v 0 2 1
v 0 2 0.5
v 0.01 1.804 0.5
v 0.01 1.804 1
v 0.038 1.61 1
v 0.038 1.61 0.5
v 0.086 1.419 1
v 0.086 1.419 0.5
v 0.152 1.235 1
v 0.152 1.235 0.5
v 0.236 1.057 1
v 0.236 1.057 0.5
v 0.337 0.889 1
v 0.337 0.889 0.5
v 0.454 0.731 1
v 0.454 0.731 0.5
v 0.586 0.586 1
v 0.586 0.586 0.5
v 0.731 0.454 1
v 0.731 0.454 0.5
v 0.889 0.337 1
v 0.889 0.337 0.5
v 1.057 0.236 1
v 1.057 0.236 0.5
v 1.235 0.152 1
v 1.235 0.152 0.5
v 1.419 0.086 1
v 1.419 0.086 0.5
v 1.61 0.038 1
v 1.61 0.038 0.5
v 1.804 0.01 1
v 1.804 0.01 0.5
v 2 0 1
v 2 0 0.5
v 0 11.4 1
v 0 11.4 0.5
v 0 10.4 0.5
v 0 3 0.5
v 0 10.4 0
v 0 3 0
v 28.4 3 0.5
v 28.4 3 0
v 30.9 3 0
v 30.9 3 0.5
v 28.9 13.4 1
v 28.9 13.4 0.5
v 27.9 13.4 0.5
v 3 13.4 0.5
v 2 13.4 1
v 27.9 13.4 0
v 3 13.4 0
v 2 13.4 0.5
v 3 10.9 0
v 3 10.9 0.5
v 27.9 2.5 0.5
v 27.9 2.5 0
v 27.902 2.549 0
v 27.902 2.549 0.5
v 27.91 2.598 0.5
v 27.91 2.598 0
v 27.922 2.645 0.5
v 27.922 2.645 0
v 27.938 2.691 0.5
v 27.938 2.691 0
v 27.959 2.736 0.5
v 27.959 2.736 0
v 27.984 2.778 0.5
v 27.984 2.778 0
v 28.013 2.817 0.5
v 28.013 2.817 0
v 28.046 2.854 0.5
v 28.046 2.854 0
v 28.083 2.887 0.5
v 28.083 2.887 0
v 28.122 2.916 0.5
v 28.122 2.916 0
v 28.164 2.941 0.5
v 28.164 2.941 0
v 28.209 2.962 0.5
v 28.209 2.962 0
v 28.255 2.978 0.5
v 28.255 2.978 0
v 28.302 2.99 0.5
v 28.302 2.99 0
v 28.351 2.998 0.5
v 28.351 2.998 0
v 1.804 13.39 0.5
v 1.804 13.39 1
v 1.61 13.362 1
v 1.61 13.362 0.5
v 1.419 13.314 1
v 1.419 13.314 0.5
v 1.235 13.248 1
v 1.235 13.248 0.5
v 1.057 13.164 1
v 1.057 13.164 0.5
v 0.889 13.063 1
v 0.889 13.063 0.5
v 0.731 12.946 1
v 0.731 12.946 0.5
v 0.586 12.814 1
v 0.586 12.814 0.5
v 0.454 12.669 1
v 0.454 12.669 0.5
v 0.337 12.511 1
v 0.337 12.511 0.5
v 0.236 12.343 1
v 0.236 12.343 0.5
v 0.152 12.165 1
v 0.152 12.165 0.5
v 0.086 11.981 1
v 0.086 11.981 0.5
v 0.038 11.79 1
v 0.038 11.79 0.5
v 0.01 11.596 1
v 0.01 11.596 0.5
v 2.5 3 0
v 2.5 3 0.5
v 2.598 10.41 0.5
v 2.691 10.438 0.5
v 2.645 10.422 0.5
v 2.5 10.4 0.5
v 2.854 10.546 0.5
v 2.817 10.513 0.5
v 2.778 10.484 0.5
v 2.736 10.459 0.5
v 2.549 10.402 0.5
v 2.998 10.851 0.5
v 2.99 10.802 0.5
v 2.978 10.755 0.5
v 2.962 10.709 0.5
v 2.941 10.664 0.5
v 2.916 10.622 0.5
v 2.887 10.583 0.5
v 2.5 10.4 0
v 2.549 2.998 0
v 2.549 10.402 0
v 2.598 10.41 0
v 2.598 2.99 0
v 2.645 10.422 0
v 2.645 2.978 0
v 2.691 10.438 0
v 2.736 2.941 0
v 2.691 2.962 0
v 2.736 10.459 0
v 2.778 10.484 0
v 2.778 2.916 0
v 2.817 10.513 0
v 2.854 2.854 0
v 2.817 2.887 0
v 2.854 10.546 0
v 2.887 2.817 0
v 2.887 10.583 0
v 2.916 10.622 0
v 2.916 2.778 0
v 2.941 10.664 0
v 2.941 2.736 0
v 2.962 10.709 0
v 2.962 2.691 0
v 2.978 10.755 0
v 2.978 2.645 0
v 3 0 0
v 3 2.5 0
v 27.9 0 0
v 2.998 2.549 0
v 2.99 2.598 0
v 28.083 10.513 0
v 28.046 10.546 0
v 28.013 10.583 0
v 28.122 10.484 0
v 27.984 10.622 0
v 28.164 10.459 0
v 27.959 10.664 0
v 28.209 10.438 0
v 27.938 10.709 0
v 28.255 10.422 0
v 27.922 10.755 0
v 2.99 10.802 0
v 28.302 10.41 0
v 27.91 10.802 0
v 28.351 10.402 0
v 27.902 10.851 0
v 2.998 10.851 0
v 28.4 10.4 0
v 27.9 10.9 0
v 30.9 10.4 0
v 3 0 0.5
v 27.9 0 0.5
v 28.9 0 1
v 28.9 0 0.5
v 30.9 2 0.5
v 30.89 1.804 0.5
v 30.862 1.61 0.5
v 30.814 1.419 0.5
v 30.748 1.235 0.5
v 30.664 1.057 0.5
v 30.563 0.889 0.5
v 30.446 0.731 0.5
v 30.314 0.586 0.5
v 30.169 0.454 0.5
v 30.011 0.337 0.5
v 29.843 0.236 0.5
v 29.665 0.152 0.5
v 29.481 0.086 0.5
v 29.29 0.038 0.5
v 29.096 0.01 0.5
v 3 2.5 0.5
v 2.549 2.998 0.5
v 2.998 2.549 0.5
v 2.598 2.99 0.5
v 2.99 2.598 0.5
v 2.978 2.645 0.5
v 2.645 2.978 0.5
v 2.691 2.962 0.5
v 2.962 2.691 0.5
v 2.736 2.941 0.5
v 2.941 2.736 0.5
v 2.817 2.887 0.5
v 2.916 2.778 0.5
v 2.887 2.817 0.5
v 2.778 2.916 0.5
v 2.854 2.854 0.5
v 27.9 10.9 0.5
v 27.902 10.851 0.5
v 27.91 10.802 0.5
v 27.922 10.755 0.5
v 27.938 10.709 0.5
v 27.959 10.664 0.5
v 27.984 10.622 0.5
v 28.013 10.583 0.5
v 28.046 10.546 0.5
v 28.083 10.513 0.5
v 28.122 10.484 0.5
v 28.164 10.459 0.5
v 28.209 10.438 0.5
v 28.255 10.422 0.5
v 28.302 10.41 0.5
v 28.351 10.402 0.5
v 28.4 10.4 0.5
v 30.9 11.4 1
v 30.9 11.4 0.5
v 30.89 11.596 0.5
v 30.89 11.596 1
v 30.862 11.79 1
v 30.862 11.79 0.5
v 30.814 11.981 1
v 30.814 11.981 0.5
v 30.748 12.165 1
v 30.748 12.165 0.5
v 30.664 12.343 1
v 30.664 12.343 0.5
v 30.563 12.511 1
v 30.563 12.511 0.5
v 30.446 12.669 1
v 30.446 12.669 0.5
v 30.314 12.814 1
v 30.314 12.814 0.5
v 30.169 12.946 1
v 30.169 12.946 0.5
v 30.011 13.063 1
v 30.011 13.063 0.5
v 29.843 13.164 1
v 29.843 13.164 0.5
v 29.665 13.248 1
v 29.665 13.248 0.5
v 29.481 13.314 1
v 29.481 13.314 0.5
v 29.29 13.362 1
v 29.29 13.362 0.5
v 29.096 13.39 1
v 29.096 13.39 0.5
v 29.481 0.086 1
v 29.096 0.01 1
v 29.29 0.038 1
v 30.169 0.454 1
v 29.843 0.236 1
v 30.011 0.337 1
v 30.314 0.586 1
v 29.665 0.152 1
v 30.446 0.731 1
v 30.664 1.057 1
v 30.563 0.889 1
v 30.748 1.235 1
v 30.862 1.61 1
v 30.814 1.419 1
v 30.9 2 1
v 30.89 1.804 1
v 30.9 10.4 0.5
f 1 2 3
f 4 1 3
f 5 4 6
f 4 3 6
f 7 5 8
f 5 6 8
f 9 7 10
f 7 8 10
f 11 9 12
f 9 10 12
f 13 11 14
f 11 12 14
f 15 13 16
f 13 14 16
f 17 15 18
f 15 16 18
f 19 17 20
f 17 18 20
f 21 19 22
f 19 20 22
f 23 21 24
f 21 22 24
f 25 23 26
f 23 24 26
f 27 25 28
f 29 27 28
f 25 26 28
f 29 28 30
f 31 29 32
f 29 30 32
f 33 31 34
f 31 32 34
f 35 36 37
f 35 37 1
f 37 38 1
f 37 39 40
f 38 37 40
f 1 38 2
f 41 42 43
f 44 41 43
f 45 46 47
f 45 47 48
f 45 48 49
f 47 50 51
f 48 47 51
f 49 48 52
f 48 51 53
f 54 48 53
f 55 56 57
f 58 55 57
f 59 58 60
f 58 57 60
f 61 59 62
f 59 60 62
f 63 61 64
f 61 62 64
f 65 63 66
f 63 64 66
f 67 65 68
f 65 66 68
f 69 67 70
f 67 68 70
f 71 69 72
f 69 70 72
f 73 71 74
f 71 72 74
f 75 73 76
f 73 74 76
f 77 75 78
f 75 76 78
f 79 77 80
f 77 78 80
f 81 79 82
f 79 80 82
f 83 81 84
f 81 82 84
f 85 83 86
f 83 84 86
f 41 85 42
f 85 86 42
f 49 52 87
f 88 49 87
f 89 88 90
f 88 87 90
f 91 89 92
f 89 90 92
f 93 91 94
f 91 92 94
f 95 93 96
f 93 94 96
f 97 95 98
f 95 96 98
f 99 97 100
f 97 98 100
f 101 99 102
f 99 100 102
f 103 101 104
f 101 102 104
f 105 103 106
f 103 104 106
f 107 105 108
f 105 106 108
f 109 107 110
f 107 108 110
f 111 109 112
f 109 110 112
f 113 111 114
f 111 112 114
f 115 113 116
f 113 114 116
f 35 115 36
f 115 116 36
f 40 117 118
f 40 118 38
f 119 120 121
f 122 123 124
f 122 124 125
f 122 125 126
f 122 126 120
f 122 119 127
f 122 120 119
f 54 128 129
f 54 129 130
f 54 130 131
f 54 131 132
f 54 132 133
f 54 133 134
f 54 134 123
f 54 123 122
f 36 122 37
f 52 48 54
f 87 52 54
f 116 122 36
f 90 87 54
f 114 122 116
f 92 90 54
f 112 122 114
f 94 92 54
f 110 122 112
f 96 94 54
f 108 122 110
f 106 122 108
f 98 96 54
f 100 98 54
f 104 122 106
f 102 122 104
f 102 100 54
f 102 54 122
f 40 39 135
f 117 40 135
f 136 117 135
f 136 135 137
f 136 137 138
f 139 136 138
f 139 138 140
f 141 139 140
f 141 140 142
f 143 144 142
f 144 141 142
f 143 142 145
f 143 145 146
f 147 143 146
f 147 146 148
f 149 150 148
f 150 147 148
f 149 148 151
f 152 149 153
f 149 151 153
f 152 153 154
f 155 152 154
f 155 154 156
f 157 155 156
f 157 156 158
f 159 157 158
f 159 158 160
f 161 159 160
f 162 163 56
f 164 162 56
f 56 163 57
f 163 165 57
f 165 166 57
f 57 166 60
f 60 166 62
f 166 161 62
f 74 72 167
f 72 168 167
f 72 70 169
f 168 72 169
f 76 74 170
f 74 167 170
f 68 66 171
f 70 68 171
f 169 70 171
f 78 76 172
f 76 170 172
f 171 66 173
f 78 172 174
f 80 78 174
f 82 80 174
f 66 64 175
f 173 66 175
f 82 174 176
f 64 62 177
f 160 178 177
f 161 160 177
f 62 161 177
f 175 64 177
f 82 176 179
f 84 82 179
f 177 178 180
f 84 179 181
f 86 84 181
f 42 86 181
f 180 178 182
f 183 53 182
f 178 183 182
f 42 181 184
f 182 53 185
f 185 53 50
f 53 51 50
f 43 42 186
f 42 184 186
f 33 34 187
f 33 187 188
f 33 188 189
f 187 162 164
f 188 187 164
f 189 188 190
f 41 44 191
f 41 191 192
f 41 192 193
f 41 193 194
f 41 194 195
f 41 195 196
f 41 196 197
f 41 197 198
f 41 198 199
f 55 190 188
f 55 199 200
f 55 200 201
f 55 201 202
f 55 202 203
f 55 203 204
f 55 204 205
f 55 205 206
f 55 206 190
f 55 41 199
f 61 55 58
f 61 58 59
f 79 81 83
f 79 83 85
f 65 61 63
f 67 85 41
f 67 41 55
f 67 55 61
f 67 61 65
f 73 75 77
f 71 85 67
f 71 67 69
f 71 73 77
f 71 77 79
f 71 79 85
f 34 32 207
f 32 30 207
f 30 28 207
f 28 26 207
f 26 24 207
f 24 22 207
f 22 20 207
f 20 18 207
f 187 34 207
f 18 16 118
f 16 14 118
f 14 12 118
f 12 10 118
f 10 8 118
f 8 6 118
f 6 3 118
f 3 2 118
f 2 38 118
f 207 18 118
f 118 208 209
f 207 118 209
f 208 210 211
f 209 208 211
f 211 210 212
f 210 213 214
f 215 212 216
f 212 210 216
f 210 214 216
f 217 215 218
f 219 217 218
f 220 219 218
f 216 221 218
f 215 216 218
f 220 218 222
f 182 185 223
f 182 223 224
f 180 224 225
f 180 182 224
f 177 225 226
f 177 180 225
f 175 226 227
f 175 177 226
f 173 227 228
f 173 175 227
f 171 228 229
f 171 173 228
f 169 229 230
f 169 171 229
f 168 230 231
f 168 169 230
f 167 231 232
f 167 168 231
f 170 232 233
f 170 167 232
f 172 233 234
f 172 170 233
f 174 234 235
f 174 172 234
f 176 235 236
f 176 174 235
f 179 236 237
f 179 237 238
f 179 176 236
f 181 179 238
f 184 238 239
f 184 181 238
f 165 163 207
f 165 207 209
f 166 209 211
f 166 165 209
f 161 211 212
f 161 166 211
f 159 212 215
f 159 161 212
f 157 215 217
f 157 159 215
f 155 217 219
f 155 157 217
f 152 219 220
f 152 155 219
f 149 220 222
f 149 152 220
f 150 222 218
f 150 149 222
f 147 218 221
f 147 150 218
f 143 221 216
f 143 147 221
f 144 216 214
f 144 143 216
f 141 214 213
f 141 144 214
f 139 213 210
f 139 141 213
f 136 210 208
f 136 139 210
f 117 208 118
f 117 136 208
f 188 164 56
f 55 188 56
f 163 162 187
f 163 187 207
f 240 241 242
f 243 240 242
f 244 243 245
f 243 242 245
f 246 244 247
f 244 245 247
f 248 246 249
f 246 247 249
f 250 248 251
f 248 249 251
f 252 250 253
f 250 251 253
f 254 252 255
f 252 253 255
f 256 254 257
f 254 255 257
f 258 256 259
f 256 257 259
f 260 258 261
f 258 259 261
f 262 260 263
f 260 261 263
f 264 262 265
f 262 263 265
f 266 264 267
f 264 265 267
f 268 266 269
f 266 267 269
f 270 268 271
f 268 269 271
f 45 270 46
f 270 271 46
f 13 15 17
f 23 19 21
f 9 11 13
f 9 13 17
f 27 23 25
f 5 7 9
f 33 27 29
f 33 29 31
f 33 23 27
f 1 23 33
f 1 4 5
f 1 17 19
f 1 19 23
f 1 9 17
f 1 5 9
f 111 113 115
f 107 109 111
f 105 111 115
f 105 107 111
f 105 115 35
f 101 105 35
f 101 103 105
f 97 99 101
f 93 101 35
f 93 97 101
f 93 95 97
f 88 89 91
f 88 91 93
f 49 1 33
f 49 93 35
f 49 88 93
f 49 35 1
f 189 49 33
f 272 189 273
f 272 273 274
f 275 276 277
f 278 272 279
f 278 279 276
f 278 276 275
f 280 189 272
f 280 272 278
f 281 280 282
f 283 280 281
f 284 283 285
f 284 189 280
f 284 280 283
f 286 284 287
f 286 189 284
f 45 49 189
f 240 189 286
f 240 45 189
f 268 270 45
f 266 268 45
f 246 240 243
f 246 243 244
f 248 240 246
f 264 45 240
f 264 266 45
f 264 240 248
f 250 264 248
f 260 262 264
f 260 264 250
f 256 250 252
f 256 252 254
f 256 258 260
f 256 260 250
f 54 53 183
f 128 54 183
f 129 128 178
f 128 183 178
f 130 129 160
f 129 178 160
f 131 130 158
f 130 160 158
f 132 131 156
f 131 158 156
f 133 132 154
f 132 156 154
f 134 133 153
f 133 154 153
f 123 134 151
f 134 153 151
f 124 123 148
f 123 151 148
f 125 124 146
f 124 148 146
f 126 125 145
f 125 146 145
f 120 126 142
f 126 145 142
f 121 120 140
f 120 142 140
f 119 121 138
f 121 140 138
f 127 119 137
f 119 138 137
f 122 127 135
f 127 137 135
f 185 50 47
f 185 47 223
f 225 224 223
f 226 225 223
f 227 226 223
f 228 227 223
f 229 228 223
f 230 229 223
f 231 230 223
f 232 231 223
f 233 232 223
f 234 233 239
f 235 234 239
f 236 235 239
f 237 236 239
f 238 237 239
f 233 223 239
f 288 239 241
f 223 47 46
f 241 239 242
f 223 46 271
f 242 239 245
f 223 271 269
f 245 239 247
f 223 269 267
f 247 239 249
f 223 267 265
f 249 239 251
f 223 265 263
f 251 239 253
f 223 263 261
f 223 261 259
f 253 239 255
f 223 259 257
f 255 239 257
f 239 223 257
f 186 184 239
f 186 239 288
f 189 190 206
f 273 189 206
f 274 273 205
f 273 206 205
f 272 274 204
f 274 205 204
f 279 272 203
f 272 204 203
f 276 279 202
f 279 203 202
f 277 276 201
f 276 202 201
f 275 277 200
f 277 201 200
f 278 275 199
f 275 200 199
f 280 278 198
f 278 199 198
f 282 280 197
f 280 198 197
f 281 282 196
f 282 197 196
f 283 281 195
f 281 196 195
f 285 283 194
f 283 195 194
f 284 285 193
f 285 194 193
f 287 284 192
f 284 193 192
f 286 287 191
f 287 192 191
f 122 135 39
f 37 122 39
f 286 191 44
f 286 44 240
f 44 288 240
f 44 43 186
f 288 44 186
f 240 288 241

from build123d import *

# Parameters (mm, degrees)
EXTRUDE_1_DEPTH     = 1
CUT_EXTRUDE_2_DEPTH = 0.5


with BuildPart() as part:
    # 草图1 → 凸台-拉伸1 (new body)
    with BuildSketch(Plane.XY):
        with BuildLine():
            Line((2, 0), (28.9, 0))
            ThreePointArc((28.9, 0), (30.314213562, 0.585786438), (30.9, 2))
            Line((30.9, 2), (30.9, 11.4))
            ThreePointArc((30.9, 11.4), (30.314213562, 12.814213562), (28.9, 13.4))
            Line((28.9, 13.4), (2, 13.4))
            ThreePointArc((2, 13.4), (0.585786438, 12.814213562), (0, 11.4))
            Line((0, 11.4), (0, 2))
            ThreePointArc((0, 2), (0.585786438, 0.585786438), (2, 0))
        make_face()
    extrude(amount=EXTRUDE_1_DEPTH)

    # 草图3 → 切除-拉伸2 (cut)
    with BuildSketch(Plane(origin=(0, 0, 0), x_dir=(-1, 0, 0), z_dir=(0, 0, -1))):
        with BuildLine():
            Line((-30.9, 13.4), (-27.9, 13.4))
            Line((-27.9, 13.4), (-27.9, 10.9))
            ThreePointArc((-27.9, 10.9), (-28.046446609, 10.546446609), (-28.4, 10.4))
            Line((-28.4, 10.4), (-30.9, 10.4))
            Line((-30.9, 10.4), (-30.9, 13.4))
        make_face()
        with BuildLine():
            Line((-3, 13.4), (-3, 10.9))
            ThreePointArc((-3, 10.9), (-2.853553391, 10.546446609), (-2.5, 10.4))
            Line((-2.5, 10.4), (0, 10.4))
            Line((0, 10.4), (0, 13.4))
            Line((0, 13.4), (-3, 13.4))
        make_face()
        with BuildLine():
            Line((0, 0), (-3, 0))
            Line((-3, 0), (-3, 2.5))
            ThreePointArc((-3, 2.5), (-2.853553391, 2.853553391), (-2.5, 3))
            Line((-2.5, 3), (0, 3))
            Line((0, 3), (0, 0))
        make_face()
        with BuildLine():
            Line((-27.9, 0), (-27.9, 2.5))
            ThreePointArc((-27.9, 2.5), (-28.046446609, 2.853553391), (-28.4, 3))
            Line((-28.4, 3), (-30.9, 3))
            Line((-30.9, 3), (-30.9, 0))
            Line((-30.9, 0), (-27.9, 0))
        make_face()
    extrude(amount=-CUT_EXTRUDE_2_DEPTH, mode=Mode.SUBTRACT)


solid = part.part
